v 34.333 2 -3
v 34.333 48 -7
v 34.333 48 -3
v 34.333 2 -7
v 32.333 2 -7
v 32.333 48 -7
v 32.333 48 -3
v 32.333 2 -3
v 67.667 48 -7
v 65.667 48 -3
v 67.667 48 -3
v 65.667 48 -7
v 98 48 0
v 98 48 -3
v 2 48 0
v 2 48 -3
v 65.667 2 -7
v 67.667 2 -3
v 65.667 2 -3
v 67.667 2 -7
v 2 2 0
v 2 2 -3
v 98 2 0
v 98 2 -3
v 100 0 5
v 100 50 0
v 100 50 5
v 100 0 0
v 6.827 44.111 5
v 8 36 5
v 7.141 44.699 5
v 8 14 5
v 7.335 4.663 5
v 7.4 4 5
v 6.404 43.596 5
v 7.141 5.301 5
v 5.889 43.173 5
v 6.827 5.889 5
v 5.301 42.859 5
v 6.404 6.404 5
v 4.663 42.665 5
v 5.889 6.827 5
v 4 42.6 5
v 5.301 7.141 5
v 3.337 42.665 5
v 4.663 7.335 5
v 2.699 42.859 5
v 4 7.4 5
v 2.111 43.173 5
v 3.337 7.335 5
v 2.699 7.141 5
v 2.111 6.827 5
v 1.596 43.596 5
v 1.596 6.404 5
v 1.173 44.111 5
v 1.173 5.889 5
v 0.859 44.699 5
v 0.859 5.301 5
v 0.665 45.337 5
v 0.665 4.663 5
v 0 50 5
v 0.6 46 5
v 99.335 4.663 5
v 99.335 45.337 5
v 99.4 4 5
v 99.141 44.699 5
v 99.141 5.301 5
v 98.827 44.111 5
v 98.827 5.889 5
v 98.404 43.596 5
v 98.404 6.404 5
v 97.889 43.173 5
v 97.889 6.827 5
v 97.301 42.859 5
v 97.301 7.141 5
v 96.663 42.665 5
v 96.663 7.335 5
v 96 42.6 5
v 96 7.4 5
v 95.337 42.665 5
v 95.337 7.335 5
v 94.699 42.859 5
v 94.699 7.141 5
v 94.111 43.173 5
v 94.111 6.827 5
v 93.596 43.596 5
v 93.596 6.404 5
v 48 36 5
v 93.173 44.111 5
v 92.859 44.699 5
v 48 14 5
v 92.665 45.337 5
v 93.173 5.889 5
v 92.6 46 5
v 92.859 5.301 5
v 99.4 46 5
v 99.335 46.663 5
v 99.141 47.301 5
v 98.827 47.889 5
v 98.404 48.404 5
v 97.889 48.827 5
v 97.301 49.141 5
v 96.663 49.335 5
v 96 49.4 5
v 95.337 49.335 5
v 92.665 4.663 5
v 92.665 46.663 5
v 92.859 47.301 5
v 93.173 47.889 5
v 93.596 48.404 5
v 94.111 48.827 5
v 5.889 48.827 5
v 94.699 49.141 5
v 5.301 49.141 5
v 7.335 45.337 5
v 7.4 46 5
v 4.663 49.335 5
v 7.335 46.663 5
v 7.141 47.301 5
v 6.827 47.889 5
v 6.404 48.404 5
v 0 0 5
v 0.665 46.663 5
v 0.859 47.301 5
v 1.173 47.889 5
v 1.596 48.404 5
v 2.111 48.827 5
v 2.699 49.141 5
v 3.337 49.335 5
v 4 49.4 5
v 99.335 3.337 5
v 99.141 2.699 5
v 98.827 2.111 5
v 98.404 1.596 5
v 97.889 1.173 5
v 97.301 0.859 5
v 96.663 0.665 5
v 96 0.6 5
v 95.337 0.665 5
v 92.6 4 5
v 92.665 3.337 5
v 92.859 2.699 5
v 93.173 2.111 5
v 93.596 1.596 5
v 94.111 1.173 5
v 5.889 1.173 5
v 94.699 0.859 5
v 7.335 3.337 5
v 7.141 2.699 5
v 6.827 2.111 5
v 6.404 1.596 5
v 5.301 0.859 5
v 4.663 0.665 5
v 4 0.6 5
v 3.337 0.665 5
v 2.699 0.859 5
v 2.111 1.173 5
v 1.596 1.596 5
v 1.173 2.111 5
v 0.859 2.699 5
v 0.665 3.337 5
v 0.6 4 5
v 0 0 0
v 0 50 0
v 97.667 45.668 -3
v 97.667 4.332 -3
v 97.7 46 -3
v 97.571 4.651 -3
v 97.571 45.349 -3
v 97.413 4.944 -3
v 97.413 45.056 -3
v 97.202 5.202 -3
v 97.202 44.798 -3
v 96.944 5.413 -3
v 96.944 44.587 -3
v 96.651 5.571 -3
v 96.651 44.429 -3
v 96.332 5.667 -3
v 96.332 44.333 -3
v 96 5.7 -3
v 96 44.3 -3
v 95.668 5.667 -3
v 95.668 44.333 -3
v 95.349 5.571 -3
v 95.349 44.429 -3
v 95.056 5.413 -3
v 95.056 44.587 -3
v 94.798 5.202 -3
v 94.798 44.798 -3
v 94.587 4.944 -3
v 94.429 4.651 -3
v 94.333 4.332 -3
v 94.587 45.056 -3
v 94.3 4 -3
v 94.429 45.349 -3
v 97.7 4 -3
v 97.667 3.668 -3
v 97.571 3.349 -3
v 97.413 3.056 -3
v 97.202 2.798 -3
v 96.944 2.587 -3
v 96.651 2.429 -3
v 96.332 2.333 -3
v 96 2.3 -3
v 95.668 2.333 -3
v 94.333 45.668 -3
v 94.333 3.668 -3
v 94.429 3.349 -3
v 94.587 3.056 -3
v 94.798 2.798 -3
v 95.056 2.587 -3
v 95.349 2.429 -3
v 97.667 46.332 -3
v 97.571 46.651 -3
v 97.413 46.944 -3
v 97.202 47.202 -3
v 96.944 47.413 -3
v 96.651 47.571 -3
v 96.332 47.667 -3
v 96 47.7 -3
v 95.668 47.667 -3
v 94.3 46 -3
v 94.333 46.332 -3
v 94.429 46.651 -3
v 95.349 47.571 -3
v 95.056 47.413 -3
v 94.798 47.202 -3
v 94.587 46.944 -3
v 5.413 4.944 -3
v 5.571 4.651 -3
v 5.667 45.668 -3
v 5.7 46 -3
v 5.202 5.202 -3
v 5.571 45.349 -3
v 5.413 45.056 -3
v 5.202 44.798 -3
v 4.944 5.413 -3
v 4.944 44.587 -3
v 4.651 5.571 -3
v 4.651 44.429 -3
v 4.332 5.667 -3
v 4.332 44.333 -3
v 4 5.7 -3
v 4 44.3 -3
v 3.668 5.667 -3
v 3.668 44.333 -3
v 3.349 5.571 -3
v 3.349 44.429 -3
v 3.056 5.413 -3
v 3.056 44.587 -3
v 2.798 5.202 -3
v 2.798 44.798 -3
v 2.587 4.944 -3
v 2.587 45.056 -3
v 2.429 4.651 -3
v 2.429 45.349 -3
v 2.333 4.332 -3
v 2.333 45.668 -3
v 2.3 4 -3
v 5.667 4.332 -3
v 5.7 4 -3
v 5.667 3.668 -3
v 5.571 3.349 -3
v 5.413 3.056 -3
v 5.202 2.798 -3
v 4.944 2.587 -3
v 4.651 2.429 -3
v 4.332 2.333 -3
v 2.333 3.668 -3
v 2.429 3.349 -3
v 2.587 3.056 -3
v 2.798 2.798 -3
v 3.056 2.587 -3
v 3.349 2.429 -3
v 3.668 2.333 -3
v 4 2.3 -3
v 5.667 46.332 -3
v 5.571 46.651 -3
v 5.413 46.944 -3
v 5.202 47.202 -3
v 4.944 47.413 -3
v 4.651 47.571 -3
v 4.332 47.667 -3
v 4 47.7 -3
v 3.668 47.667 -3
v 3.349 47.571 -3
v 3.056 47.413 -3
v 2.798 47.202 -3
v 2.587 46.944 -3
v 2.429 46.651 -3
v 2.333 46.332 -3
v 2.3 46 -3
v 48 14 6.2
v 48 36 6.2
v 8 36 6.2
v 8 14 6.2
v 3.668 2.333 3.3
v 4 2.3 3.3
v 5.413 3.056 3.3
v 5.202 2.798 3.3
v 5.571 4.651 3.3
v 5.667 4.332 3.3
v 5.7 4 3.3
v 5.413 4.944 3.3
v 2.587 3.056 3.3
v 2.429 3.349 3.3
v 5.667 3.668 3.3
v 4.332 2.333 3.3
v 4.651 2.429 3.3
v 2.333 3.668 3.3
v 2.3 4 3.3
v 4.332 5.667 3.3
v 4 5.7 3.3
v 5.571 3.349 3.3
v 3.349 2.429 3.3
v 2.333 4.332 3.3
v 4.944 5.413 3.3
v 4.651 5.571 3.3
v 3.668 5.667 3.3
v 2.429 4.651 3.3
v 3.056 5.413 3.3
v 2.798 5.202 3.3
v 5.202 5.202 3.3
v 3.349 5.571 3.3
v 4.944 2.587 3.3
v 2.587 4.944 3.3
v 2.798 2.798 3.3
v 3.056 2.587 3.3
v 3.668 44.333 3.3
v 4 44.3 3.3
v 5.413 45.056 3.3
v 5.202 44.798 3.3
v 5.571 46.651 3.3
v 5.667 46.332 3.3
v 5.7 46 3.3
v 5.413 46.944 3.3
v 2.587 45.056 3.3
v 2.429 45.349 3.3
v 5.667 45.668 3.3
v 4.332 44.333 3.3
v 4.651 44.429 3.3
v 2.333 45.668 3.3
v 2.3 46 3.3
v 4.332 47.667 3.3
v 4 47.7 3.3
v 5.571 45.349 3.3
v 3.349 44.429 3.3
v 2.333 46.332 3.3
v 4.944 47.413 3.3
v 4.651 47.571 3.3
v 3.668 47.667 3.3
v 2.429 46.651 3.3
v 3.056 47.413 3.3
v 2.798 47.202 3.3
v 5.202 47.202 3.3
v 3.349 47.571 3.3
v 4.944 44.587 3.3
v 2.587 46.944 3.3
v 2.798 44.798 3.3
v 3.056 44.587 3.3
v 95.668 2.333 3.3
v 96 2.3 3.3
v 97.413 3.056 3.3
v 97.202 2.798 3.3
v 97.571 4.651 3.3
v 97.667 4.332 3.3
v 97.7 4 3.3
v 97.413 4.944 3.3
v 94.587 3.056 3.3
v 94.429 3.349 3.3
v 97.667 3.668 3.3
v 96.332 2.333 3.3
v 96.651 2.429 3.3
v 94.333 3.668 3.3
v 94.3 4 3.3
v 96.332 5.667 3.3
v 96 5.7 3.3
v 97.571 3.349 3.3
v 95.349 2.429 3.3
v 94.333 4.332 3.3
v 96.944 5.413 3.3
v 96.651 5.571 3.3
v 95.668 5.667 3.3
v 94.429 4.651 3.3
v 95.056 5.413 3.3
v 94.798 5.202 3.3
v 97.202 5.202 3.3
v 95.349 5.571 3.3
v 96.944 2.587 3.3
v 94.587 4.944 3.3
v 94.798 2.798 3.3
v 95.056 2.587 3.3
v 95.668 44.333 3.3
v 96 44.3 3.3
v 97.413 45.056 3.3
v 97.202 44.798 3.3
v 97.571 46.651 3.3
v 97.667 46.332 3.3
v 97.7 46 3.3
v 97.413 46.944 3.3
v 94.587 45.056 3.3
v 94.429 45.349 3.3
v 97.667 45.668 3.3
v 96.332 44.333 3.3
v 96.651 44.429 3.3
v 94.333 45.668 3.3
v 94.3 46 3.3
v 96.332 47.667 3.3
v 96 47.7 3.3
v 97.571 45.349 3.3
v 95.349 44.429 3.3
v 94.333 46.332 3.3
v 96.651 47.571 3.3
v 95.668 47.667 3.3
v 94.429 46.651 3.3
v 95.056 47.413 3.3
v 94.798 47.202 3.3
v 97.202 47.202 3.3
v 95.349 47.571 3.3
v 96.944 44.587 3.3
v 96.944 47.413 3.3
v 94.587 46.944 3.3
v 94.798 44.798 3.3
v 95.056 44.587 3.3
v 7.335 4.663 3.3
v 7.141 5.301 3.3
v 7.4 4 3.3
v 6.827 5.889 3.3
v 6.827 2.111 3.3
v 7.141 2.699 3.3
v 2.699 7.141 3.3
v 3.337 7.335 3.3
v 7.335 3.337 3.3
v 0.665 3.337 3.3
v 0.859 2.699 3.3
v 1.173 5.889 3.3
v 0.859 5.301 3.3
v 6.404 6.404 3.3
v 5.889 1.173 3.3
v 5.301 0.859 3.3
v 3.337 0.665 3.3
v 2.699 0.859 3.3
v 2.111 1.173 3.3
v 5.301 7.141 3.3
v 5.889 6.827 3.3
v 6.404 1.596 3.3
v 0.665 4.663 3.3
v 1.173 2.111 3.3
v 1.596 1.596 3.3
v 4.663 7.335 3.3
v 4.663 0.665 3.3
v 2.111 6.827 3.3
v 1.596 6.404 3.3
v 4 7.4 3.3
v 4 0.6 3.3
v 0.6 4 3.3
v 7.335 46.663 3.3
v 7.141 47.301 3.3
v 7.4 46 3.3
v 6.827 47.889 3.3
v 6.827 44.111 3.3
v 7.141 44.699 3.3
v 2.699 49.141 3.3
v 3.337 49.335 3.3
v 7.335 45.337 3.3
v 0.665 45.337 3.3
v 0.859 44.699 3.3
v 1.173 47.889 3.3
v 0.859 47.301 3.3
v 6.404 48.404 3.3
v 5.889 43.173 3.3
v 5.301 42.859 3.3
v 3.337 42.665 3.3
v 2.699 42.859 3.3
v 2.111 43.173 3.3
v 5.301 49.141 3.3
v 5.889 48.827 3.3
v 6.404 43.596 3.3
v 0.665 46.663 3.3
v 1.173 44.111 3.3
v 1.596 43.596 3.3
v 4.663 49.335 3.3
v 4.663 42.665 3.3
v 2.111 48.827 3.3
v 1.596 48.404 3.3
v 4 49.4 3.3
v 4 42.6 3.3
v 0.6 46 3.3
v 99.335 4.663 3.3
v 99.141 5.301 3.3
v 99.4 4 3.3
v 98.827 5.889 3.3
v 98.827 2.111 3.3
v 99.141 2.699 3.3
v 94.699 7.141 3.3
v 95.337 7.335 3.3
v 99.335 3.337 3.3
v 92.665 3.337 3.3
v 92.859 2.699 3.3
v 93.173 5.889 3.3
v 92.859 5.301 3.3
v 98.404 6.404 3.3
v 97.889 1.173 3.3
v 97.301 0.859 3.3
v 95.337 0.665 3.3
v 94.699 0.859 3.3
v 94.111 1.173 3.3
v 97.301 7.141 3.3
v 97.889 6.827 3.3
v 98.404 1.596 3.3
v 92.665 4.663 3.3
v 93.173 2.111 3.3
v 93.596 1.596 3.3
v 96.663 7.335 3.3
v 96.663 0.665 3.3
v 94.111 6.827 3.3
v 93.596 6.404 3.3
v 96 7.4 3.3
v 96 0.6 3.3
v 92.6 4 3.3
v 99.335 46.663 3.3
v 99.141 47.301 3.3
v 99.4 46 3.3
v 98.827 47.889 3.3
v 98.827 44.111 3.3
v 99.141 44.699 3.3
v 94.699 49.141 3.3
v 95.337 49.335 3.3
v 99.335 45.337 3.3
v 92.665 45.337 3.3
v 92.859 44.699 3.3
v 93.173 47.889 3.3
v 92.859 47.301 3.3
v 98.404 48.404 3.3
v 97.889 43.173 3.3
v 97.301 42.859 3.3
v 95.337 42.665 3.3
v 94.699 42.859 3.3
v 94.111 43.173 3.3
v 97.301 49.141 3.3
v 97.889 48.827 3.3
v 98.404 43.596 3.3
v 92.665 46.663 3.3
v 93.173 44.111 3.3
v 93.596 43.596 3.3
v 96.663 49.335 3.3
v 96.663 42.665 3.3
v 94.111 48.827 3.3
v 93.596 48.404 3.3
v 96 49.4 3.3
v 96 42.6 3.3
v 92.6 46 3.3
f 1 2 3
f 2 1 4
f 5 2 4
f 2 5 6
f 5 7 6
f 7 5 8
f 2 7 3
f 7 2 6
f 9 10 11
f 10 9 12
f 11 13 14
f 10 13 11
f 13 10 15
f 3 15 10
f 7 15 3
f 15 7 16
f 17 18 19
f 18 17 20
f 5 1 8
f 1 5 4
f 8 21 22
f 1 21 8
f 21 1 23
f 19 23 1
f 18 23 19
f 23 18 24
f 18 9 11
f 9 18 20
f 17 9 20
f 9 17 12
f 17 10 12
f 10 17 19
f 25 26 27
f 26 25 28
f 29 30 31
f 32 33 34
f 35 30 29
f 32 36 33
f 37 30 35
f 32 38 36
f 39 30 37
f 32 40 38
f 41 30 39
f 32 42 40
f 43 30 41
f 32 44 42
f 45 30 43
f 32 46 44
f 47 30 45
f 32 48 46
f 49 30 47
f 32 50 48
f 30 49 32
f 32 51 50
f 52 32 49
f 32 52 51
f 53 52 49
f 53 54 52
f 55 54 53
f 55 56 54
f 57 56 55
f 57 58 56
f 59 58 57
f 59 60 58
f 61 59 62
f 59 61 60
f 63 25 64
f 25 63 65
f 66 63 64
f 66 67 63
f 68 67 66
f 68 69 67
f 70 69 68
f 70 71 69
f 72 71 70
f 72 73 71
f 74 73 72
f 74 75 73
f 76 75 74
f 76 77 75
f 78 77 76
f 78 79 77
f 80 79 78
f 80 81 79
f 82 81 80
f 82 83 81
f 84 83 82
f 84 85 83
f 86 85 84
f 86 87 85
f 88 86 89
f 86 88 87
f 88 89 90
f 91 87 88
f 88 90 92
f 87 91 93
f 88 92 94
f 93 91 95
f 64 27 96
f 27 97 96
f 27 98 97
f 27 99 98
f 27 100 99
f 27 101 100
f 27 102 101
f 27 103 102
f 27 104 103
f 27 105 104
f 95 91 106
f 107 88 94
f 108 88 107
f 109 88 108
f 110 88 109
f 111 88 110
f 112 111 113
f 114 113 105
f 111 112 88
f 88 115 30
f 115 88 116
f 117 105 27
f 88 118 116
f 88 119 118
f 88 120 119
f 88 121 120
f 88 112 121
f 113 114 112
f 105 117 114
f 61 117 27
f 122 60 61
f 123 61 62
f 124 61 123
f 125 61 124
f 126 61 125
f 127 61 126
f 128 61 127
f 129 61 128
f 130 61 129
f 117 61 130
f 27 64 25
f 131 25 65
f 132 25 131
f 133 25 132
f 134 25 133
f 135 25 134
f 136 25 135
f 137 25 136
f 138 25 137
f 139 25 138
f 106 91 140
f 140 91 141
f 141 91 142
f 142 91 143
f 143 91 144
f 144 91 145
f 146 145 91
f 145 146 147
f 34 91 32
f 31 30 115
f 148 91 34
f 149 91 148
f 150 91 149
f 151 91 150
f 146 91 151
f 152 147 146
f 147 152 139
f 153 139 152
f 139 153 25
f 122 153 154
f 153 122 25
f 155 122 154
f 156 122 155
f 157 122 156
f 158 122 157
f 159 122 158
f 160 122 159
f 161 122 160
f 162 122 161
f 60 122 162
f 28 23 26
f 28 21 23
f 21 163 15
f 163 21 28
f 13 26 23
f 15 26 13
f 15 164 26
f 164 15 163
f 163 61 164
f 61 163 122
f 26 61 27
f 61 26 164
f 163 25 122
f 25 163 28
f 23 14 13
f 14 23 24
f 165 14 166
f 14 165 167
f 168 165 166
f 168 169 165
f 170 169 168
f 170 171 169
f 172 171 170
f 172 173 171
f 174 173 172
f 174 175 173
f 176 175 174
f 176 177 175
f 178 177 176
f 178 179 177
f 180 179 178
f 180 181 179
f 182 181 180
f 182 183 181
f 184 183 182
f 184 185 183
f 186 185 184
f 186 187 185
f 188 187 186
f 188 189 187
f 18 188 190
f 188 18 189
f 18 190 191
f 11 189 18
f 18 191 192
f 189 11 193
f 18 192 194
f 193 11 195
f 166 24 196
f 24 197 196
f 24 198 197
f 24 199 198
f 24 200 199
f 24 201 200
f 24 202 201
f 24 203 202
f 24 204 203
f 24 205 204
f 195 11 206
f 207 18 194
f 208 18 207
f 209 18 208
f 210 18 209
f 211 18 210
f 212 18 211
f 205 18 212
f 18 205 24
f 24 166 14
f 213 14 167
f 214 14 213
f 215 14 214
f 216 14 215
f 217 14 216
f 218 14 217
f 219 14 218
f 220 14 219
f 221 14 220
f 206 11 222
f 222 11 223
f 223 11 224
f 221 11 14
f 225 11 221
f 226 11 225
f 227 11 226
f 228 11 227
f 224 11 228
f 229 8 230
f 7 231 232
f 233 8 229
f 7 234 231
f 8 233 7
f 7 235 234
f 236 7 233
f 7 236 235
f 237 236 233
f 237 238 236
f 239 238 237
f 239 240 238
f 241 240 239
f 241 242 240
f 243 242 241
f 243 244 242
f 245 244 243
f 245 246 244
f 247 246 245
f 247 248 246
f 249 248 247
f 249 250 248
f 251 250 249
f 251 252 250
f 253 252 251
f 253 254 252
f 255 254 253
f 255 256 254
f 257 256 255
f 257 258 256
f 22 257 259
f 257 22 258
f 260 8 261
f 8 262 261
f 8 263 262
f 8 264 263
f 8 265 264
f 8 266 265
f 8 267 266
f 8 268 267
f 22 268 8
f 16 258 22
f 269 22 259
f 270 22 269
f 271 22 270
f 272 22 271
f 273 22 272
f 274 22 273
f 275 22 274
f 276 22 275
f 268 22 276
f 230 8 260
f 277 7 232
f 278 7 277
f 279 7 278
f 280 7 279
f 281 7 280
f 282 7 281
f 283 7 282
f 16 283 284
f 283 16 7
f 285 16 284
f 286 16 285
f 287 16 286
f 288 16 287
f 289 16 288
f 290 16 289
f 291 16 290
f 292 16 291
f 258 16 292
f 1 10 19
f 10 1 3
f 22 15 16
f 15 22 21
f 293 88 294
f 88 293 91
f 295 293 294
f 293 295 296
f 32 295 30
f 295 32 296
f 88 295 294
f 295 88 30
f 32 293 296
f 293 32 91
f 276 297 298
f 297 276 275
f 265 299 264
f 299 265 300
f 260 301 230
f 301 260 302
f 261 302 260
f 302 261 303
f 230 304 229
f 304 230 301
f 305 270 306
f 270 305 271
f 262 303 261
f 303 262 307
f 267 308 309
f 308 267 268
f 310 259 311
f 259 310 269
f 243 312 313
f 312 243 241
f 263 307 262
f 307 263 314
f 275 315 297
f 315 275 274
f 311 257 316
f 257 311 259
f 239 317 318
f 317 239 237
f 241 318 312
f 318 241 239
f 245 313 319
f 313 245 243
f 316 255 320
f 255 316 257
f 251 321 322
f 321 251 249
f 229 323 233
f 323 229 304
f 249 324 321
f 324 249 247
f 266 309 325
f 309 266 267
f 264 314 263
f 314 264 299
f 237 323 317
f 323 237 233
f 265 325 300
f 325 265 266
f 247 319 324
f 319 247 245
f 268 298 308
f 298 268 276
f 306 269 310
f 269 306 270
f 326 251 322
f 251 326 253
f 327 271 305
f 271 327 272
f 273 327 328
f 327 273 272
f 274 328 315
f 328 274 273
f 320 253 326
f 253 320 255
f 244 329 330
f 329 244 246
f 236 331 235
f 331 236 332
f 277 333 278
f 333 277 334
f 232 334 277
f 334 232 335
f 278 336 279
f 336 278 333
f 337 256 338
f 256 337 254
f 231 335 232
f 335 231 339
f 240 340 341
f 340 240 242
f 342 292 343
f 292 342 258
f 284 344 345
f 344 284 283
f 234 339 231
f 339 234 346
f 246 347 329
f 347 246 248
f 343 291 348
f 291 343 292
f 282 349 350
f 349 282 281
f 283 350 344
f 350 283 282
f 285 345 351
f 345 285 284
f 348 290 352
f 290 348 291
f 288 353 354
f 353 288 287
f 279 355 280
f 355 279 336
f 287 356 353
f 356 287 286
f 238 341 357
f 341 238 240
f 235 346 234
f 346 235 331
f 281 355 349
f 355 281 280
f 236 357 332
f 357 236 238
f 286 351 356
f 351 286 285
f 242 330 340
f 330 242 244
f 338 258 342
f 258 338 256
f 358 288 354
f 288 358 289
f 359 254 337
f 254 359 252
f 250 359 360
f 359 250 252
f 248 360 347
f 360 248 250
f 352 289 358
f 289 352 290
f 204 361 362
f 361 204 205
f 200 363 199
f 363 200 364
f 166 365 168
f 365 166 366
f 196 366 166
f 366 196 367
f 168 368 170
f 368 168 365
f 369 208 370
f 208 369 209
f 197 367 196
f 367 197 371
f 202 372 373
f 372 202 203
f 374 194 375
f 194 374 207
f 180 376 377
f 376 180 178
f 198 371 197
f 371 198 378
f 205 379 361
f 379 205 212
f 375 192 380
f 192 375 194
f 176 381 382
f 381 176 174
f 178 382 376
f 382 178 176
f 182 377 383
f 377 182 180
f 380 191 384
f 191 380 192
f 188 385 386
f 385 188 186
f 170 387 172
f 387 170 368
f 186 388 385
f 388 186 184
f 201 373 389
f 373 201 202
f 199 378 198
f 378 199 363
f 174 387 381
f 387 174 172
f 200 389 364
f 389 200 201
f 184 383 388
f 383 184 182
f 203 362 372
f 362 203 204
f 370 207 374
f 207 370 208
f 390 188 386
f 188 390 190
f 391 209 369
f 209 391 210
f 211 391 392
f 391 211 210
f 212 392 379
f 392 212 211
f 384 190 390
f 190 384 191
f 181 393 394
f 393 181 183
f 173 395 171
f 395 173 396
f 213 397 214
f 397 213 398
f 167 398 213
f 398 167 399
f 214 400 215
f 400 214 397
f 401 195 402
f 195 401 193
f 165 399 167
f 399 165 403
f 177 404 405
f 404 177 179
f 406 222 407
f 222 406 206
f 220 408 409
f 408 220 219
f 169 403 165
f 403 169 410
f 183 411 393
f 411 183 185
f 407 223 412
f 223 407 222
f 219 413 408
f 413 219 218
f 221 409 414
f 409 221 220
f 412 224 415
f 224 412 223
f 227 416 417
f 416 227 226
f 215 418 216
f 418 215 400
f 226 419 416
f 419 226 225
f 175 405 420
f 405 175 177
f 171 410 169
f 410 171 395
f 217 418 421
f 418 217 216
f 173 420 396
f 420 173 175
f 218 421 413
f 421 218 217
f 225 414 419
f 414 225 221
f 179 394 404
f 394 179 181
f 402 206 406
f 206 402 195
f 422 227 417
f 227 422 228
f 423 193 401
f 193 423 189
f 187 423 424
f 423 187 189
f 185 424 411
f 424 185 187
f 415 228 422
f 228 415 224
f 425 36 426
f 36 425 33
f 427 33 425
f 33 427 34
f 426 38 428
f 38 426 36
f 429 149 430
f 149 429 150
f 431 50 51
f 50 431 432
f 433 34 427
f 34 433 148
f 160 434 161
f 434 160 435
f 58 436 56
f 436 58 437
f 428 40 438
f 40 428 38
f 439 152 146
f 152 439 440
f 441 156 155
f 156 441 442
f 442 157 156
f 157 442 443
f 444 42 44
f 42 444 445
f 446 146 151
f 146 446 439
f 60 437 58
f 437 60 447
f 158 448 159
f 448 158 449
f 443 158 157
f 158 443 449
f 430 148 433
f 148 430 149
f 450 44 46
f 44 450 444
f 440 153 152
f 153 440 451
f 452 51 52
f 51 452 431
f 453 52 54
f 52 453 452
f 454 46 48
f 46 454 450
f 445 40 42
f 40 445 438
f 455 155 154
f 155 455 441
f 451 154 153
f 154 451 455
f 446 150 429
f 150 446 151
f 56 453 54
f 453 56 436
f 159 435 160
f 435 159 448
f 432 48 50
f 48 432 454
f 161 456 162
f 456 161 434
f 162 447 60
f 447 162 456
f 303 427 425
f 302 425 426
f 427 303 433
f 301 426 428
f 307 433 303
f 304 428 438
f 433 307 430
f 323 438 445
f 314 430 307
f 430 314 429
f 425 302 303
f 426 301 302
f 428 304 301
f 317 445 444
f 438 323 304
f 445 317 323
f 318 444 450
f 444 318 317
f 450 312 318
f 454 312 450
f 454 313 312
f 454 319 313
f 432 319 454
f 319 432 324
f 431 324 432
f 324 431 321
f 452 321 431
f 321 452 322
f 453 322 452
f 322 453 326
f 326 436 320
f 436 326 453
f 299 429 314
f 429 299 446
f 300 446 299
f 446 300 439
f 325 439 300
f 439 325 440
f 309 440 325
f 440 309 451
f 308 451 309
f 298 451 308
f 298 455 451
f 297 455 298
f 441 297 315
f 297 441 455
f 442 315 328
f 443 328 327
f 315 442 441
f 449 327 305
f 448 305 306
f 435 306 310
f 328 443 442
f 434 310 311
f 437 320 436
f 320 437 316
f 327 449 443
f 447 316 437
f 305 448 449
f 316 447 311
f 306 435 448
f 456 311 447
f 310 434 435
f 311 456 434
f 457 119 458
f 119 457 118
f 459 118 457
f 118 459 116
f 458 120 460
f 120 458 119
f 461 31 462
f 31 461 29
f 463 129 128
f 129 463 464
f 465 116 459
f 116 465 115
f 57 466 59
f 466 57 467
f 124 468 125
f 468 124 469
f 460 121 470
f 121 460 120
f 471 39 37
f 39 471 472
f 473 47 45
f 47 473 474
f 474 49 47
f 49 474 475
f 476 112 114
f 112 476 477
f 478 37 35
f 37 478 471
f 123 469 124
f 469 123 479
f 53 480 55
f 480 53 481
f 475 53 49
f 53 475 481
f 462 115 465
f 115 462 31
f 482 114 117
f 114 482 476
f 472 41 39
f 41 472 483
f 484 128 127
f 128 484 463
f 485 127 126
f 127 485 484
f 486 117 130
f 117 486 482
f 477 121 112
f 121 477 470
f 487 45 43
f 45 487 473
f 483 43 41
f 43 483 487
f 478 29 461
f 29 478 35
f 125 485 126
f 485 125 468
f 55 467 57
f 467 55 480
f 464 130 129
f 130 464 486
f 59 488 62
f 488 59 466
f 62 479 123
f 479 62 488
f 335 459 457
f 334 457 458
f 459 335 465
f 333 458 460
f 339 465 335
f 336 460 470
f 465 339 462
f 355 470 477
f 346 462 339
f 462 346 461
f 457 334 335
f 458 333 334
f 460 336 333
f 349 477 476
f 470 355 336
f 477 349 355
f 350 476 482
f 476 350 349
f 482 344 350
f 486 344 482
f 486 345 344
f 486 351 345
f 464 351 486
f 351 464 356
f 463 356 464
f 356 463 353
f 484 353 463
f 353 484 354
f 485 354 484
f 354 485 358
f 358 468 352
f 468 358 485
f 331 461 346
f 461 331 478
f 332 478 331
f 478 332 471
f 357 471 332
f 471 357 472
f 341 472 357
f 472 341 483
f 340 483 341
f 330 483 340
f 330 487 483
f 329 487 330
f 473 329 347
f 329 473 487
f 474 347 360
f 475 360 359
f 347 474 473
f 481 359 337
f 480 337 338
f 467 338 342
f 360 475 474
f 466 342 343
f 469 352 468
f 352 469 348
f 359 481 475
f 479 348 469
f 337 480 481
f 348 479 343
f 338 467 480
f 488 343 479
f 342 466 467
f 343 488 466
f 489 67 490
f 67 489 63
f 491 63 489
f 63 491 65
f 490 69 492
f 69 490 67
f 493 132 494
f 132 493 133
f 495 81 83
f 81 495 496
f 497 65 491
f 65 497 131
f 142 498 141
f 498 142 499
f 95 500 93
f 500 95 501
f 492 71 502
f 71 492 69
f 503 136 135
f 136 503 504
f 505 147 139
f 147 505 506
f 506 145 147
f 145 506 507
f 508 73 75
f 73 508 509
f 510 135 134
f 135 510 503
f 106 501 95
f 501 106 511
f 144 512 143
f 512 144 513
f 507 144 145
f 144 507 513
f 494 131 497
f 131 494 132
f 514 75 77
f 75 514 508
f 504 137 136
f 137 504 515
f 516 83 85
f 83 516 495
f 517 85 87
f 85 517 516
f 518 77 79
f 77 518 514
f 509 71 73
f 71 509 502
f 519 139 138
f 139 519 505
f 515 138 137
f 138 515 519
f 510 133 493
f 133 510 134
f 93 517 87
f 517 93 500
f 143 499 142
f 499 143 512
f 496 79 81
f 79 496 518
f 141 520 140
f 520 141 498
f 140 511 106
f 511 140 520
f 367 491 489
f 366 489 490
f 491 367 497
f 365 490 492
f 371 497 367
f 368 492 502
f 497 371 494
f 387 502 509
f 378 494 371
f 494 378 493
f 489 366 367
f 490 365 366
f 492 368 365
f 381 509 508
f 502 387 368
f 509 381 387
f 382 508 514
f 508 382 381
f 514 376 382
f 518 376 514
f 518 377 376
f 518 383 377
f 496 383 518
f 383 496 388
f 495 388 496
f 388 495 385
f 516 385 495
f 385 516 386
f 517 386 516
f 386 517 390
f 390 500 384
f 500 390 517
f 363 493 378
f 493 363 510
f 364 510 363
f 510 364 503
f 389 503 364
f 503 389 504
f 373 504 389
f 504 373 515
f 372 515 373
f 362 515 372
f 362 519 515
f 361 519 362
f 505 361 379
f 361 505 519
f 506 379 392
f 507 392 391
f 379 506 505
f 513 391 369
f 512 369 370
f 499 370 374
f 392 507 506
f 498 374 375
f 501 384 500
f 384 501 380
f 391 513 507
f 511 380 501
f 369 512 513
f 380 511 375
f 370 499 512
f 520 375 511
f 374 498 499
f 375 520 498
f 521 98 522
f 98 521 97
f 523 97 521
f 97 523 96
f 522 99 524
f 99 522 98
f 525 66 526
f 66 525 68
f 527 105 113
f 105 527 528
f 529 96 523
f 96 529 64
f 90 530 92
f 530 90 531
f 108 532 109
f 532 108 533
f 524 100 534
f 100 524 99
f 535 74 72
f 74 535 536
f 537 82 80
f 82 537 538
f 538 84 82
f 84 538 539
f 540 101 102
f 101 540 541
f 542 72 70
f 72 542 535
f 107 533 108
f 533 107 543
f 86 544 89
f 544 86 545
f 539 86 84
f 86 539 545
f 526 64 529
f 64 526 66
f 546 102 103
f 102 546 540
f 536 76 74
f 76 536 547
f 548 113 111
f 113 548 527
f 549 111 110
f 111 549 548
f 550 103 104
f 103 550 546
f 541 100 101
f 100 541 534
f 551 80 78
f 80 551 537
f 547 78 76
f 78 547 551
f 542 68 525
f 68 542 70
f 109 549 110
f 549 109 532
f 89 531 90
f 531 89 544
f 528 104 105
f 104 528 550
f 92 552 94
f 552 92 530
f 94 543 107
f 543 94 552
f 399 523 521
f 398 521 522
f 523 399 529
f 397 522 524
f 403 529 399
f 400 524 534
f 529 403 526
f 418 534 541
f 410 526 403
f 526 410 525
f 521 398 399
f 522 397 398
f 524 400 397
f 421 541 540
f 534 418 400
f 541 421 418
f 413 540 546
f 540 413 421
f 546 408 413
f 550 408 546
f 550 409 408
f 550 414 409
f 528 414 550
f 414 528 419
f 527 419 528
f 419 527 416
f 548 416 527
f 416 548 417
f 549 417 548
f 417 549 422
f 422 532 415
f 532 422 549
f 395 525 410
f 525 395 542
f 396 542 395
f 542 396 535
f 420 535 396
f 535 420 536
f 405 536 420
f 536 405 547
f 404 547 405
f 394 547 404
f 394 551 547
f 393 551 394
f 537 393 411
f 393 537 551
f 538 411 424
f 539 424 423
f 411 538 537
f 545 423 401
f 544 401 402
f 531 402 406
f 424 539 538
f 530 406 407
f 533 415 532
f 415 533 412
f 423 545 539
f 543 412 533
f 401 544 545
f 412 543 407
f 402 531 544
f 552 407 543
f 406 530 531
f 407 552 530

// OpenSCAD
$fn = 32;

// ----------------------------------------------------------------------
// Enclosure lid: 100 x 50 x 5 mm, 4 bolt holes
// ----------------------------------------------------------------------

// --- parameters (mm) ---
length = 100;             // lid length, X
width = 50;               // lid width, Y
plate_t = 5;              // lid plate thickness
bolt_d = 3.4;             // bolt clearance
boss_lip = 4;             // bolt hole inset from the corner
sink = 1;                 // overlap of the lip and ribs into the plate
lip_h = 4;                // lip height below the plate
lip_wall = 2;             // lip wall thickness
cs_d = 6.8;               // countersink diameter
cs_h = 1.7;               // countersink depth
rib_n = 2;                // stiffening ribs
rib_t = 2;                // rib thickness
rib_h = 8;                // rib height below the plate
label_h = 1.2;            // raised marking pad

module plate() {
  cube([length, width, plate_t]);
  /* lip that drops into the housing opening, sunk into the plate */
  translate([lip_wall, lip_wall, -lip_h + sink]) cube([length - 2 * lip_wall, width - 2 * lip_wall, lip_h]);
  /* stiffening ribs under the plate */
  for (i = [1 : rib_n]) translate([length * i / (rib_n + 1) - rib_t / 2, lip_wall, -rib_h + sink]) cube([rib_t, width - 2 * lip_wall, rib_h]);
  /* raised marking pad on top, sunk 1 mm into the plate */
  translate([length * 0.08, width * 0.28, plate_t - 1]) cube([length * 0.4, width * 0.44, label_h + 1]);
}

difference() {
  plate();
  /* bolt pattern matching the corner bosses */
  for (sx = [0, 1]) for (sy = [0, 1])
    translate([sx * (length - 2 * boss_lip) + boss_lip, sy * (width - 2 * boss_lip) + boss_lip, -lip_h - 1])
      cylinder(h = plate_t + lip_h + 2, d = bolt_d);
  /* countersinks so the heads sit flush */
  for (sx = [0, 1]) for (sy = [0, 1])
    translate([sx * (length - 2 * boss_lip) + boss_lip, sy * (width - 2 * boss_lip) + boss_lip, plate_t - cs_h])
      cylinder(h = cs_h + 0.5, d = cs_d);
}
